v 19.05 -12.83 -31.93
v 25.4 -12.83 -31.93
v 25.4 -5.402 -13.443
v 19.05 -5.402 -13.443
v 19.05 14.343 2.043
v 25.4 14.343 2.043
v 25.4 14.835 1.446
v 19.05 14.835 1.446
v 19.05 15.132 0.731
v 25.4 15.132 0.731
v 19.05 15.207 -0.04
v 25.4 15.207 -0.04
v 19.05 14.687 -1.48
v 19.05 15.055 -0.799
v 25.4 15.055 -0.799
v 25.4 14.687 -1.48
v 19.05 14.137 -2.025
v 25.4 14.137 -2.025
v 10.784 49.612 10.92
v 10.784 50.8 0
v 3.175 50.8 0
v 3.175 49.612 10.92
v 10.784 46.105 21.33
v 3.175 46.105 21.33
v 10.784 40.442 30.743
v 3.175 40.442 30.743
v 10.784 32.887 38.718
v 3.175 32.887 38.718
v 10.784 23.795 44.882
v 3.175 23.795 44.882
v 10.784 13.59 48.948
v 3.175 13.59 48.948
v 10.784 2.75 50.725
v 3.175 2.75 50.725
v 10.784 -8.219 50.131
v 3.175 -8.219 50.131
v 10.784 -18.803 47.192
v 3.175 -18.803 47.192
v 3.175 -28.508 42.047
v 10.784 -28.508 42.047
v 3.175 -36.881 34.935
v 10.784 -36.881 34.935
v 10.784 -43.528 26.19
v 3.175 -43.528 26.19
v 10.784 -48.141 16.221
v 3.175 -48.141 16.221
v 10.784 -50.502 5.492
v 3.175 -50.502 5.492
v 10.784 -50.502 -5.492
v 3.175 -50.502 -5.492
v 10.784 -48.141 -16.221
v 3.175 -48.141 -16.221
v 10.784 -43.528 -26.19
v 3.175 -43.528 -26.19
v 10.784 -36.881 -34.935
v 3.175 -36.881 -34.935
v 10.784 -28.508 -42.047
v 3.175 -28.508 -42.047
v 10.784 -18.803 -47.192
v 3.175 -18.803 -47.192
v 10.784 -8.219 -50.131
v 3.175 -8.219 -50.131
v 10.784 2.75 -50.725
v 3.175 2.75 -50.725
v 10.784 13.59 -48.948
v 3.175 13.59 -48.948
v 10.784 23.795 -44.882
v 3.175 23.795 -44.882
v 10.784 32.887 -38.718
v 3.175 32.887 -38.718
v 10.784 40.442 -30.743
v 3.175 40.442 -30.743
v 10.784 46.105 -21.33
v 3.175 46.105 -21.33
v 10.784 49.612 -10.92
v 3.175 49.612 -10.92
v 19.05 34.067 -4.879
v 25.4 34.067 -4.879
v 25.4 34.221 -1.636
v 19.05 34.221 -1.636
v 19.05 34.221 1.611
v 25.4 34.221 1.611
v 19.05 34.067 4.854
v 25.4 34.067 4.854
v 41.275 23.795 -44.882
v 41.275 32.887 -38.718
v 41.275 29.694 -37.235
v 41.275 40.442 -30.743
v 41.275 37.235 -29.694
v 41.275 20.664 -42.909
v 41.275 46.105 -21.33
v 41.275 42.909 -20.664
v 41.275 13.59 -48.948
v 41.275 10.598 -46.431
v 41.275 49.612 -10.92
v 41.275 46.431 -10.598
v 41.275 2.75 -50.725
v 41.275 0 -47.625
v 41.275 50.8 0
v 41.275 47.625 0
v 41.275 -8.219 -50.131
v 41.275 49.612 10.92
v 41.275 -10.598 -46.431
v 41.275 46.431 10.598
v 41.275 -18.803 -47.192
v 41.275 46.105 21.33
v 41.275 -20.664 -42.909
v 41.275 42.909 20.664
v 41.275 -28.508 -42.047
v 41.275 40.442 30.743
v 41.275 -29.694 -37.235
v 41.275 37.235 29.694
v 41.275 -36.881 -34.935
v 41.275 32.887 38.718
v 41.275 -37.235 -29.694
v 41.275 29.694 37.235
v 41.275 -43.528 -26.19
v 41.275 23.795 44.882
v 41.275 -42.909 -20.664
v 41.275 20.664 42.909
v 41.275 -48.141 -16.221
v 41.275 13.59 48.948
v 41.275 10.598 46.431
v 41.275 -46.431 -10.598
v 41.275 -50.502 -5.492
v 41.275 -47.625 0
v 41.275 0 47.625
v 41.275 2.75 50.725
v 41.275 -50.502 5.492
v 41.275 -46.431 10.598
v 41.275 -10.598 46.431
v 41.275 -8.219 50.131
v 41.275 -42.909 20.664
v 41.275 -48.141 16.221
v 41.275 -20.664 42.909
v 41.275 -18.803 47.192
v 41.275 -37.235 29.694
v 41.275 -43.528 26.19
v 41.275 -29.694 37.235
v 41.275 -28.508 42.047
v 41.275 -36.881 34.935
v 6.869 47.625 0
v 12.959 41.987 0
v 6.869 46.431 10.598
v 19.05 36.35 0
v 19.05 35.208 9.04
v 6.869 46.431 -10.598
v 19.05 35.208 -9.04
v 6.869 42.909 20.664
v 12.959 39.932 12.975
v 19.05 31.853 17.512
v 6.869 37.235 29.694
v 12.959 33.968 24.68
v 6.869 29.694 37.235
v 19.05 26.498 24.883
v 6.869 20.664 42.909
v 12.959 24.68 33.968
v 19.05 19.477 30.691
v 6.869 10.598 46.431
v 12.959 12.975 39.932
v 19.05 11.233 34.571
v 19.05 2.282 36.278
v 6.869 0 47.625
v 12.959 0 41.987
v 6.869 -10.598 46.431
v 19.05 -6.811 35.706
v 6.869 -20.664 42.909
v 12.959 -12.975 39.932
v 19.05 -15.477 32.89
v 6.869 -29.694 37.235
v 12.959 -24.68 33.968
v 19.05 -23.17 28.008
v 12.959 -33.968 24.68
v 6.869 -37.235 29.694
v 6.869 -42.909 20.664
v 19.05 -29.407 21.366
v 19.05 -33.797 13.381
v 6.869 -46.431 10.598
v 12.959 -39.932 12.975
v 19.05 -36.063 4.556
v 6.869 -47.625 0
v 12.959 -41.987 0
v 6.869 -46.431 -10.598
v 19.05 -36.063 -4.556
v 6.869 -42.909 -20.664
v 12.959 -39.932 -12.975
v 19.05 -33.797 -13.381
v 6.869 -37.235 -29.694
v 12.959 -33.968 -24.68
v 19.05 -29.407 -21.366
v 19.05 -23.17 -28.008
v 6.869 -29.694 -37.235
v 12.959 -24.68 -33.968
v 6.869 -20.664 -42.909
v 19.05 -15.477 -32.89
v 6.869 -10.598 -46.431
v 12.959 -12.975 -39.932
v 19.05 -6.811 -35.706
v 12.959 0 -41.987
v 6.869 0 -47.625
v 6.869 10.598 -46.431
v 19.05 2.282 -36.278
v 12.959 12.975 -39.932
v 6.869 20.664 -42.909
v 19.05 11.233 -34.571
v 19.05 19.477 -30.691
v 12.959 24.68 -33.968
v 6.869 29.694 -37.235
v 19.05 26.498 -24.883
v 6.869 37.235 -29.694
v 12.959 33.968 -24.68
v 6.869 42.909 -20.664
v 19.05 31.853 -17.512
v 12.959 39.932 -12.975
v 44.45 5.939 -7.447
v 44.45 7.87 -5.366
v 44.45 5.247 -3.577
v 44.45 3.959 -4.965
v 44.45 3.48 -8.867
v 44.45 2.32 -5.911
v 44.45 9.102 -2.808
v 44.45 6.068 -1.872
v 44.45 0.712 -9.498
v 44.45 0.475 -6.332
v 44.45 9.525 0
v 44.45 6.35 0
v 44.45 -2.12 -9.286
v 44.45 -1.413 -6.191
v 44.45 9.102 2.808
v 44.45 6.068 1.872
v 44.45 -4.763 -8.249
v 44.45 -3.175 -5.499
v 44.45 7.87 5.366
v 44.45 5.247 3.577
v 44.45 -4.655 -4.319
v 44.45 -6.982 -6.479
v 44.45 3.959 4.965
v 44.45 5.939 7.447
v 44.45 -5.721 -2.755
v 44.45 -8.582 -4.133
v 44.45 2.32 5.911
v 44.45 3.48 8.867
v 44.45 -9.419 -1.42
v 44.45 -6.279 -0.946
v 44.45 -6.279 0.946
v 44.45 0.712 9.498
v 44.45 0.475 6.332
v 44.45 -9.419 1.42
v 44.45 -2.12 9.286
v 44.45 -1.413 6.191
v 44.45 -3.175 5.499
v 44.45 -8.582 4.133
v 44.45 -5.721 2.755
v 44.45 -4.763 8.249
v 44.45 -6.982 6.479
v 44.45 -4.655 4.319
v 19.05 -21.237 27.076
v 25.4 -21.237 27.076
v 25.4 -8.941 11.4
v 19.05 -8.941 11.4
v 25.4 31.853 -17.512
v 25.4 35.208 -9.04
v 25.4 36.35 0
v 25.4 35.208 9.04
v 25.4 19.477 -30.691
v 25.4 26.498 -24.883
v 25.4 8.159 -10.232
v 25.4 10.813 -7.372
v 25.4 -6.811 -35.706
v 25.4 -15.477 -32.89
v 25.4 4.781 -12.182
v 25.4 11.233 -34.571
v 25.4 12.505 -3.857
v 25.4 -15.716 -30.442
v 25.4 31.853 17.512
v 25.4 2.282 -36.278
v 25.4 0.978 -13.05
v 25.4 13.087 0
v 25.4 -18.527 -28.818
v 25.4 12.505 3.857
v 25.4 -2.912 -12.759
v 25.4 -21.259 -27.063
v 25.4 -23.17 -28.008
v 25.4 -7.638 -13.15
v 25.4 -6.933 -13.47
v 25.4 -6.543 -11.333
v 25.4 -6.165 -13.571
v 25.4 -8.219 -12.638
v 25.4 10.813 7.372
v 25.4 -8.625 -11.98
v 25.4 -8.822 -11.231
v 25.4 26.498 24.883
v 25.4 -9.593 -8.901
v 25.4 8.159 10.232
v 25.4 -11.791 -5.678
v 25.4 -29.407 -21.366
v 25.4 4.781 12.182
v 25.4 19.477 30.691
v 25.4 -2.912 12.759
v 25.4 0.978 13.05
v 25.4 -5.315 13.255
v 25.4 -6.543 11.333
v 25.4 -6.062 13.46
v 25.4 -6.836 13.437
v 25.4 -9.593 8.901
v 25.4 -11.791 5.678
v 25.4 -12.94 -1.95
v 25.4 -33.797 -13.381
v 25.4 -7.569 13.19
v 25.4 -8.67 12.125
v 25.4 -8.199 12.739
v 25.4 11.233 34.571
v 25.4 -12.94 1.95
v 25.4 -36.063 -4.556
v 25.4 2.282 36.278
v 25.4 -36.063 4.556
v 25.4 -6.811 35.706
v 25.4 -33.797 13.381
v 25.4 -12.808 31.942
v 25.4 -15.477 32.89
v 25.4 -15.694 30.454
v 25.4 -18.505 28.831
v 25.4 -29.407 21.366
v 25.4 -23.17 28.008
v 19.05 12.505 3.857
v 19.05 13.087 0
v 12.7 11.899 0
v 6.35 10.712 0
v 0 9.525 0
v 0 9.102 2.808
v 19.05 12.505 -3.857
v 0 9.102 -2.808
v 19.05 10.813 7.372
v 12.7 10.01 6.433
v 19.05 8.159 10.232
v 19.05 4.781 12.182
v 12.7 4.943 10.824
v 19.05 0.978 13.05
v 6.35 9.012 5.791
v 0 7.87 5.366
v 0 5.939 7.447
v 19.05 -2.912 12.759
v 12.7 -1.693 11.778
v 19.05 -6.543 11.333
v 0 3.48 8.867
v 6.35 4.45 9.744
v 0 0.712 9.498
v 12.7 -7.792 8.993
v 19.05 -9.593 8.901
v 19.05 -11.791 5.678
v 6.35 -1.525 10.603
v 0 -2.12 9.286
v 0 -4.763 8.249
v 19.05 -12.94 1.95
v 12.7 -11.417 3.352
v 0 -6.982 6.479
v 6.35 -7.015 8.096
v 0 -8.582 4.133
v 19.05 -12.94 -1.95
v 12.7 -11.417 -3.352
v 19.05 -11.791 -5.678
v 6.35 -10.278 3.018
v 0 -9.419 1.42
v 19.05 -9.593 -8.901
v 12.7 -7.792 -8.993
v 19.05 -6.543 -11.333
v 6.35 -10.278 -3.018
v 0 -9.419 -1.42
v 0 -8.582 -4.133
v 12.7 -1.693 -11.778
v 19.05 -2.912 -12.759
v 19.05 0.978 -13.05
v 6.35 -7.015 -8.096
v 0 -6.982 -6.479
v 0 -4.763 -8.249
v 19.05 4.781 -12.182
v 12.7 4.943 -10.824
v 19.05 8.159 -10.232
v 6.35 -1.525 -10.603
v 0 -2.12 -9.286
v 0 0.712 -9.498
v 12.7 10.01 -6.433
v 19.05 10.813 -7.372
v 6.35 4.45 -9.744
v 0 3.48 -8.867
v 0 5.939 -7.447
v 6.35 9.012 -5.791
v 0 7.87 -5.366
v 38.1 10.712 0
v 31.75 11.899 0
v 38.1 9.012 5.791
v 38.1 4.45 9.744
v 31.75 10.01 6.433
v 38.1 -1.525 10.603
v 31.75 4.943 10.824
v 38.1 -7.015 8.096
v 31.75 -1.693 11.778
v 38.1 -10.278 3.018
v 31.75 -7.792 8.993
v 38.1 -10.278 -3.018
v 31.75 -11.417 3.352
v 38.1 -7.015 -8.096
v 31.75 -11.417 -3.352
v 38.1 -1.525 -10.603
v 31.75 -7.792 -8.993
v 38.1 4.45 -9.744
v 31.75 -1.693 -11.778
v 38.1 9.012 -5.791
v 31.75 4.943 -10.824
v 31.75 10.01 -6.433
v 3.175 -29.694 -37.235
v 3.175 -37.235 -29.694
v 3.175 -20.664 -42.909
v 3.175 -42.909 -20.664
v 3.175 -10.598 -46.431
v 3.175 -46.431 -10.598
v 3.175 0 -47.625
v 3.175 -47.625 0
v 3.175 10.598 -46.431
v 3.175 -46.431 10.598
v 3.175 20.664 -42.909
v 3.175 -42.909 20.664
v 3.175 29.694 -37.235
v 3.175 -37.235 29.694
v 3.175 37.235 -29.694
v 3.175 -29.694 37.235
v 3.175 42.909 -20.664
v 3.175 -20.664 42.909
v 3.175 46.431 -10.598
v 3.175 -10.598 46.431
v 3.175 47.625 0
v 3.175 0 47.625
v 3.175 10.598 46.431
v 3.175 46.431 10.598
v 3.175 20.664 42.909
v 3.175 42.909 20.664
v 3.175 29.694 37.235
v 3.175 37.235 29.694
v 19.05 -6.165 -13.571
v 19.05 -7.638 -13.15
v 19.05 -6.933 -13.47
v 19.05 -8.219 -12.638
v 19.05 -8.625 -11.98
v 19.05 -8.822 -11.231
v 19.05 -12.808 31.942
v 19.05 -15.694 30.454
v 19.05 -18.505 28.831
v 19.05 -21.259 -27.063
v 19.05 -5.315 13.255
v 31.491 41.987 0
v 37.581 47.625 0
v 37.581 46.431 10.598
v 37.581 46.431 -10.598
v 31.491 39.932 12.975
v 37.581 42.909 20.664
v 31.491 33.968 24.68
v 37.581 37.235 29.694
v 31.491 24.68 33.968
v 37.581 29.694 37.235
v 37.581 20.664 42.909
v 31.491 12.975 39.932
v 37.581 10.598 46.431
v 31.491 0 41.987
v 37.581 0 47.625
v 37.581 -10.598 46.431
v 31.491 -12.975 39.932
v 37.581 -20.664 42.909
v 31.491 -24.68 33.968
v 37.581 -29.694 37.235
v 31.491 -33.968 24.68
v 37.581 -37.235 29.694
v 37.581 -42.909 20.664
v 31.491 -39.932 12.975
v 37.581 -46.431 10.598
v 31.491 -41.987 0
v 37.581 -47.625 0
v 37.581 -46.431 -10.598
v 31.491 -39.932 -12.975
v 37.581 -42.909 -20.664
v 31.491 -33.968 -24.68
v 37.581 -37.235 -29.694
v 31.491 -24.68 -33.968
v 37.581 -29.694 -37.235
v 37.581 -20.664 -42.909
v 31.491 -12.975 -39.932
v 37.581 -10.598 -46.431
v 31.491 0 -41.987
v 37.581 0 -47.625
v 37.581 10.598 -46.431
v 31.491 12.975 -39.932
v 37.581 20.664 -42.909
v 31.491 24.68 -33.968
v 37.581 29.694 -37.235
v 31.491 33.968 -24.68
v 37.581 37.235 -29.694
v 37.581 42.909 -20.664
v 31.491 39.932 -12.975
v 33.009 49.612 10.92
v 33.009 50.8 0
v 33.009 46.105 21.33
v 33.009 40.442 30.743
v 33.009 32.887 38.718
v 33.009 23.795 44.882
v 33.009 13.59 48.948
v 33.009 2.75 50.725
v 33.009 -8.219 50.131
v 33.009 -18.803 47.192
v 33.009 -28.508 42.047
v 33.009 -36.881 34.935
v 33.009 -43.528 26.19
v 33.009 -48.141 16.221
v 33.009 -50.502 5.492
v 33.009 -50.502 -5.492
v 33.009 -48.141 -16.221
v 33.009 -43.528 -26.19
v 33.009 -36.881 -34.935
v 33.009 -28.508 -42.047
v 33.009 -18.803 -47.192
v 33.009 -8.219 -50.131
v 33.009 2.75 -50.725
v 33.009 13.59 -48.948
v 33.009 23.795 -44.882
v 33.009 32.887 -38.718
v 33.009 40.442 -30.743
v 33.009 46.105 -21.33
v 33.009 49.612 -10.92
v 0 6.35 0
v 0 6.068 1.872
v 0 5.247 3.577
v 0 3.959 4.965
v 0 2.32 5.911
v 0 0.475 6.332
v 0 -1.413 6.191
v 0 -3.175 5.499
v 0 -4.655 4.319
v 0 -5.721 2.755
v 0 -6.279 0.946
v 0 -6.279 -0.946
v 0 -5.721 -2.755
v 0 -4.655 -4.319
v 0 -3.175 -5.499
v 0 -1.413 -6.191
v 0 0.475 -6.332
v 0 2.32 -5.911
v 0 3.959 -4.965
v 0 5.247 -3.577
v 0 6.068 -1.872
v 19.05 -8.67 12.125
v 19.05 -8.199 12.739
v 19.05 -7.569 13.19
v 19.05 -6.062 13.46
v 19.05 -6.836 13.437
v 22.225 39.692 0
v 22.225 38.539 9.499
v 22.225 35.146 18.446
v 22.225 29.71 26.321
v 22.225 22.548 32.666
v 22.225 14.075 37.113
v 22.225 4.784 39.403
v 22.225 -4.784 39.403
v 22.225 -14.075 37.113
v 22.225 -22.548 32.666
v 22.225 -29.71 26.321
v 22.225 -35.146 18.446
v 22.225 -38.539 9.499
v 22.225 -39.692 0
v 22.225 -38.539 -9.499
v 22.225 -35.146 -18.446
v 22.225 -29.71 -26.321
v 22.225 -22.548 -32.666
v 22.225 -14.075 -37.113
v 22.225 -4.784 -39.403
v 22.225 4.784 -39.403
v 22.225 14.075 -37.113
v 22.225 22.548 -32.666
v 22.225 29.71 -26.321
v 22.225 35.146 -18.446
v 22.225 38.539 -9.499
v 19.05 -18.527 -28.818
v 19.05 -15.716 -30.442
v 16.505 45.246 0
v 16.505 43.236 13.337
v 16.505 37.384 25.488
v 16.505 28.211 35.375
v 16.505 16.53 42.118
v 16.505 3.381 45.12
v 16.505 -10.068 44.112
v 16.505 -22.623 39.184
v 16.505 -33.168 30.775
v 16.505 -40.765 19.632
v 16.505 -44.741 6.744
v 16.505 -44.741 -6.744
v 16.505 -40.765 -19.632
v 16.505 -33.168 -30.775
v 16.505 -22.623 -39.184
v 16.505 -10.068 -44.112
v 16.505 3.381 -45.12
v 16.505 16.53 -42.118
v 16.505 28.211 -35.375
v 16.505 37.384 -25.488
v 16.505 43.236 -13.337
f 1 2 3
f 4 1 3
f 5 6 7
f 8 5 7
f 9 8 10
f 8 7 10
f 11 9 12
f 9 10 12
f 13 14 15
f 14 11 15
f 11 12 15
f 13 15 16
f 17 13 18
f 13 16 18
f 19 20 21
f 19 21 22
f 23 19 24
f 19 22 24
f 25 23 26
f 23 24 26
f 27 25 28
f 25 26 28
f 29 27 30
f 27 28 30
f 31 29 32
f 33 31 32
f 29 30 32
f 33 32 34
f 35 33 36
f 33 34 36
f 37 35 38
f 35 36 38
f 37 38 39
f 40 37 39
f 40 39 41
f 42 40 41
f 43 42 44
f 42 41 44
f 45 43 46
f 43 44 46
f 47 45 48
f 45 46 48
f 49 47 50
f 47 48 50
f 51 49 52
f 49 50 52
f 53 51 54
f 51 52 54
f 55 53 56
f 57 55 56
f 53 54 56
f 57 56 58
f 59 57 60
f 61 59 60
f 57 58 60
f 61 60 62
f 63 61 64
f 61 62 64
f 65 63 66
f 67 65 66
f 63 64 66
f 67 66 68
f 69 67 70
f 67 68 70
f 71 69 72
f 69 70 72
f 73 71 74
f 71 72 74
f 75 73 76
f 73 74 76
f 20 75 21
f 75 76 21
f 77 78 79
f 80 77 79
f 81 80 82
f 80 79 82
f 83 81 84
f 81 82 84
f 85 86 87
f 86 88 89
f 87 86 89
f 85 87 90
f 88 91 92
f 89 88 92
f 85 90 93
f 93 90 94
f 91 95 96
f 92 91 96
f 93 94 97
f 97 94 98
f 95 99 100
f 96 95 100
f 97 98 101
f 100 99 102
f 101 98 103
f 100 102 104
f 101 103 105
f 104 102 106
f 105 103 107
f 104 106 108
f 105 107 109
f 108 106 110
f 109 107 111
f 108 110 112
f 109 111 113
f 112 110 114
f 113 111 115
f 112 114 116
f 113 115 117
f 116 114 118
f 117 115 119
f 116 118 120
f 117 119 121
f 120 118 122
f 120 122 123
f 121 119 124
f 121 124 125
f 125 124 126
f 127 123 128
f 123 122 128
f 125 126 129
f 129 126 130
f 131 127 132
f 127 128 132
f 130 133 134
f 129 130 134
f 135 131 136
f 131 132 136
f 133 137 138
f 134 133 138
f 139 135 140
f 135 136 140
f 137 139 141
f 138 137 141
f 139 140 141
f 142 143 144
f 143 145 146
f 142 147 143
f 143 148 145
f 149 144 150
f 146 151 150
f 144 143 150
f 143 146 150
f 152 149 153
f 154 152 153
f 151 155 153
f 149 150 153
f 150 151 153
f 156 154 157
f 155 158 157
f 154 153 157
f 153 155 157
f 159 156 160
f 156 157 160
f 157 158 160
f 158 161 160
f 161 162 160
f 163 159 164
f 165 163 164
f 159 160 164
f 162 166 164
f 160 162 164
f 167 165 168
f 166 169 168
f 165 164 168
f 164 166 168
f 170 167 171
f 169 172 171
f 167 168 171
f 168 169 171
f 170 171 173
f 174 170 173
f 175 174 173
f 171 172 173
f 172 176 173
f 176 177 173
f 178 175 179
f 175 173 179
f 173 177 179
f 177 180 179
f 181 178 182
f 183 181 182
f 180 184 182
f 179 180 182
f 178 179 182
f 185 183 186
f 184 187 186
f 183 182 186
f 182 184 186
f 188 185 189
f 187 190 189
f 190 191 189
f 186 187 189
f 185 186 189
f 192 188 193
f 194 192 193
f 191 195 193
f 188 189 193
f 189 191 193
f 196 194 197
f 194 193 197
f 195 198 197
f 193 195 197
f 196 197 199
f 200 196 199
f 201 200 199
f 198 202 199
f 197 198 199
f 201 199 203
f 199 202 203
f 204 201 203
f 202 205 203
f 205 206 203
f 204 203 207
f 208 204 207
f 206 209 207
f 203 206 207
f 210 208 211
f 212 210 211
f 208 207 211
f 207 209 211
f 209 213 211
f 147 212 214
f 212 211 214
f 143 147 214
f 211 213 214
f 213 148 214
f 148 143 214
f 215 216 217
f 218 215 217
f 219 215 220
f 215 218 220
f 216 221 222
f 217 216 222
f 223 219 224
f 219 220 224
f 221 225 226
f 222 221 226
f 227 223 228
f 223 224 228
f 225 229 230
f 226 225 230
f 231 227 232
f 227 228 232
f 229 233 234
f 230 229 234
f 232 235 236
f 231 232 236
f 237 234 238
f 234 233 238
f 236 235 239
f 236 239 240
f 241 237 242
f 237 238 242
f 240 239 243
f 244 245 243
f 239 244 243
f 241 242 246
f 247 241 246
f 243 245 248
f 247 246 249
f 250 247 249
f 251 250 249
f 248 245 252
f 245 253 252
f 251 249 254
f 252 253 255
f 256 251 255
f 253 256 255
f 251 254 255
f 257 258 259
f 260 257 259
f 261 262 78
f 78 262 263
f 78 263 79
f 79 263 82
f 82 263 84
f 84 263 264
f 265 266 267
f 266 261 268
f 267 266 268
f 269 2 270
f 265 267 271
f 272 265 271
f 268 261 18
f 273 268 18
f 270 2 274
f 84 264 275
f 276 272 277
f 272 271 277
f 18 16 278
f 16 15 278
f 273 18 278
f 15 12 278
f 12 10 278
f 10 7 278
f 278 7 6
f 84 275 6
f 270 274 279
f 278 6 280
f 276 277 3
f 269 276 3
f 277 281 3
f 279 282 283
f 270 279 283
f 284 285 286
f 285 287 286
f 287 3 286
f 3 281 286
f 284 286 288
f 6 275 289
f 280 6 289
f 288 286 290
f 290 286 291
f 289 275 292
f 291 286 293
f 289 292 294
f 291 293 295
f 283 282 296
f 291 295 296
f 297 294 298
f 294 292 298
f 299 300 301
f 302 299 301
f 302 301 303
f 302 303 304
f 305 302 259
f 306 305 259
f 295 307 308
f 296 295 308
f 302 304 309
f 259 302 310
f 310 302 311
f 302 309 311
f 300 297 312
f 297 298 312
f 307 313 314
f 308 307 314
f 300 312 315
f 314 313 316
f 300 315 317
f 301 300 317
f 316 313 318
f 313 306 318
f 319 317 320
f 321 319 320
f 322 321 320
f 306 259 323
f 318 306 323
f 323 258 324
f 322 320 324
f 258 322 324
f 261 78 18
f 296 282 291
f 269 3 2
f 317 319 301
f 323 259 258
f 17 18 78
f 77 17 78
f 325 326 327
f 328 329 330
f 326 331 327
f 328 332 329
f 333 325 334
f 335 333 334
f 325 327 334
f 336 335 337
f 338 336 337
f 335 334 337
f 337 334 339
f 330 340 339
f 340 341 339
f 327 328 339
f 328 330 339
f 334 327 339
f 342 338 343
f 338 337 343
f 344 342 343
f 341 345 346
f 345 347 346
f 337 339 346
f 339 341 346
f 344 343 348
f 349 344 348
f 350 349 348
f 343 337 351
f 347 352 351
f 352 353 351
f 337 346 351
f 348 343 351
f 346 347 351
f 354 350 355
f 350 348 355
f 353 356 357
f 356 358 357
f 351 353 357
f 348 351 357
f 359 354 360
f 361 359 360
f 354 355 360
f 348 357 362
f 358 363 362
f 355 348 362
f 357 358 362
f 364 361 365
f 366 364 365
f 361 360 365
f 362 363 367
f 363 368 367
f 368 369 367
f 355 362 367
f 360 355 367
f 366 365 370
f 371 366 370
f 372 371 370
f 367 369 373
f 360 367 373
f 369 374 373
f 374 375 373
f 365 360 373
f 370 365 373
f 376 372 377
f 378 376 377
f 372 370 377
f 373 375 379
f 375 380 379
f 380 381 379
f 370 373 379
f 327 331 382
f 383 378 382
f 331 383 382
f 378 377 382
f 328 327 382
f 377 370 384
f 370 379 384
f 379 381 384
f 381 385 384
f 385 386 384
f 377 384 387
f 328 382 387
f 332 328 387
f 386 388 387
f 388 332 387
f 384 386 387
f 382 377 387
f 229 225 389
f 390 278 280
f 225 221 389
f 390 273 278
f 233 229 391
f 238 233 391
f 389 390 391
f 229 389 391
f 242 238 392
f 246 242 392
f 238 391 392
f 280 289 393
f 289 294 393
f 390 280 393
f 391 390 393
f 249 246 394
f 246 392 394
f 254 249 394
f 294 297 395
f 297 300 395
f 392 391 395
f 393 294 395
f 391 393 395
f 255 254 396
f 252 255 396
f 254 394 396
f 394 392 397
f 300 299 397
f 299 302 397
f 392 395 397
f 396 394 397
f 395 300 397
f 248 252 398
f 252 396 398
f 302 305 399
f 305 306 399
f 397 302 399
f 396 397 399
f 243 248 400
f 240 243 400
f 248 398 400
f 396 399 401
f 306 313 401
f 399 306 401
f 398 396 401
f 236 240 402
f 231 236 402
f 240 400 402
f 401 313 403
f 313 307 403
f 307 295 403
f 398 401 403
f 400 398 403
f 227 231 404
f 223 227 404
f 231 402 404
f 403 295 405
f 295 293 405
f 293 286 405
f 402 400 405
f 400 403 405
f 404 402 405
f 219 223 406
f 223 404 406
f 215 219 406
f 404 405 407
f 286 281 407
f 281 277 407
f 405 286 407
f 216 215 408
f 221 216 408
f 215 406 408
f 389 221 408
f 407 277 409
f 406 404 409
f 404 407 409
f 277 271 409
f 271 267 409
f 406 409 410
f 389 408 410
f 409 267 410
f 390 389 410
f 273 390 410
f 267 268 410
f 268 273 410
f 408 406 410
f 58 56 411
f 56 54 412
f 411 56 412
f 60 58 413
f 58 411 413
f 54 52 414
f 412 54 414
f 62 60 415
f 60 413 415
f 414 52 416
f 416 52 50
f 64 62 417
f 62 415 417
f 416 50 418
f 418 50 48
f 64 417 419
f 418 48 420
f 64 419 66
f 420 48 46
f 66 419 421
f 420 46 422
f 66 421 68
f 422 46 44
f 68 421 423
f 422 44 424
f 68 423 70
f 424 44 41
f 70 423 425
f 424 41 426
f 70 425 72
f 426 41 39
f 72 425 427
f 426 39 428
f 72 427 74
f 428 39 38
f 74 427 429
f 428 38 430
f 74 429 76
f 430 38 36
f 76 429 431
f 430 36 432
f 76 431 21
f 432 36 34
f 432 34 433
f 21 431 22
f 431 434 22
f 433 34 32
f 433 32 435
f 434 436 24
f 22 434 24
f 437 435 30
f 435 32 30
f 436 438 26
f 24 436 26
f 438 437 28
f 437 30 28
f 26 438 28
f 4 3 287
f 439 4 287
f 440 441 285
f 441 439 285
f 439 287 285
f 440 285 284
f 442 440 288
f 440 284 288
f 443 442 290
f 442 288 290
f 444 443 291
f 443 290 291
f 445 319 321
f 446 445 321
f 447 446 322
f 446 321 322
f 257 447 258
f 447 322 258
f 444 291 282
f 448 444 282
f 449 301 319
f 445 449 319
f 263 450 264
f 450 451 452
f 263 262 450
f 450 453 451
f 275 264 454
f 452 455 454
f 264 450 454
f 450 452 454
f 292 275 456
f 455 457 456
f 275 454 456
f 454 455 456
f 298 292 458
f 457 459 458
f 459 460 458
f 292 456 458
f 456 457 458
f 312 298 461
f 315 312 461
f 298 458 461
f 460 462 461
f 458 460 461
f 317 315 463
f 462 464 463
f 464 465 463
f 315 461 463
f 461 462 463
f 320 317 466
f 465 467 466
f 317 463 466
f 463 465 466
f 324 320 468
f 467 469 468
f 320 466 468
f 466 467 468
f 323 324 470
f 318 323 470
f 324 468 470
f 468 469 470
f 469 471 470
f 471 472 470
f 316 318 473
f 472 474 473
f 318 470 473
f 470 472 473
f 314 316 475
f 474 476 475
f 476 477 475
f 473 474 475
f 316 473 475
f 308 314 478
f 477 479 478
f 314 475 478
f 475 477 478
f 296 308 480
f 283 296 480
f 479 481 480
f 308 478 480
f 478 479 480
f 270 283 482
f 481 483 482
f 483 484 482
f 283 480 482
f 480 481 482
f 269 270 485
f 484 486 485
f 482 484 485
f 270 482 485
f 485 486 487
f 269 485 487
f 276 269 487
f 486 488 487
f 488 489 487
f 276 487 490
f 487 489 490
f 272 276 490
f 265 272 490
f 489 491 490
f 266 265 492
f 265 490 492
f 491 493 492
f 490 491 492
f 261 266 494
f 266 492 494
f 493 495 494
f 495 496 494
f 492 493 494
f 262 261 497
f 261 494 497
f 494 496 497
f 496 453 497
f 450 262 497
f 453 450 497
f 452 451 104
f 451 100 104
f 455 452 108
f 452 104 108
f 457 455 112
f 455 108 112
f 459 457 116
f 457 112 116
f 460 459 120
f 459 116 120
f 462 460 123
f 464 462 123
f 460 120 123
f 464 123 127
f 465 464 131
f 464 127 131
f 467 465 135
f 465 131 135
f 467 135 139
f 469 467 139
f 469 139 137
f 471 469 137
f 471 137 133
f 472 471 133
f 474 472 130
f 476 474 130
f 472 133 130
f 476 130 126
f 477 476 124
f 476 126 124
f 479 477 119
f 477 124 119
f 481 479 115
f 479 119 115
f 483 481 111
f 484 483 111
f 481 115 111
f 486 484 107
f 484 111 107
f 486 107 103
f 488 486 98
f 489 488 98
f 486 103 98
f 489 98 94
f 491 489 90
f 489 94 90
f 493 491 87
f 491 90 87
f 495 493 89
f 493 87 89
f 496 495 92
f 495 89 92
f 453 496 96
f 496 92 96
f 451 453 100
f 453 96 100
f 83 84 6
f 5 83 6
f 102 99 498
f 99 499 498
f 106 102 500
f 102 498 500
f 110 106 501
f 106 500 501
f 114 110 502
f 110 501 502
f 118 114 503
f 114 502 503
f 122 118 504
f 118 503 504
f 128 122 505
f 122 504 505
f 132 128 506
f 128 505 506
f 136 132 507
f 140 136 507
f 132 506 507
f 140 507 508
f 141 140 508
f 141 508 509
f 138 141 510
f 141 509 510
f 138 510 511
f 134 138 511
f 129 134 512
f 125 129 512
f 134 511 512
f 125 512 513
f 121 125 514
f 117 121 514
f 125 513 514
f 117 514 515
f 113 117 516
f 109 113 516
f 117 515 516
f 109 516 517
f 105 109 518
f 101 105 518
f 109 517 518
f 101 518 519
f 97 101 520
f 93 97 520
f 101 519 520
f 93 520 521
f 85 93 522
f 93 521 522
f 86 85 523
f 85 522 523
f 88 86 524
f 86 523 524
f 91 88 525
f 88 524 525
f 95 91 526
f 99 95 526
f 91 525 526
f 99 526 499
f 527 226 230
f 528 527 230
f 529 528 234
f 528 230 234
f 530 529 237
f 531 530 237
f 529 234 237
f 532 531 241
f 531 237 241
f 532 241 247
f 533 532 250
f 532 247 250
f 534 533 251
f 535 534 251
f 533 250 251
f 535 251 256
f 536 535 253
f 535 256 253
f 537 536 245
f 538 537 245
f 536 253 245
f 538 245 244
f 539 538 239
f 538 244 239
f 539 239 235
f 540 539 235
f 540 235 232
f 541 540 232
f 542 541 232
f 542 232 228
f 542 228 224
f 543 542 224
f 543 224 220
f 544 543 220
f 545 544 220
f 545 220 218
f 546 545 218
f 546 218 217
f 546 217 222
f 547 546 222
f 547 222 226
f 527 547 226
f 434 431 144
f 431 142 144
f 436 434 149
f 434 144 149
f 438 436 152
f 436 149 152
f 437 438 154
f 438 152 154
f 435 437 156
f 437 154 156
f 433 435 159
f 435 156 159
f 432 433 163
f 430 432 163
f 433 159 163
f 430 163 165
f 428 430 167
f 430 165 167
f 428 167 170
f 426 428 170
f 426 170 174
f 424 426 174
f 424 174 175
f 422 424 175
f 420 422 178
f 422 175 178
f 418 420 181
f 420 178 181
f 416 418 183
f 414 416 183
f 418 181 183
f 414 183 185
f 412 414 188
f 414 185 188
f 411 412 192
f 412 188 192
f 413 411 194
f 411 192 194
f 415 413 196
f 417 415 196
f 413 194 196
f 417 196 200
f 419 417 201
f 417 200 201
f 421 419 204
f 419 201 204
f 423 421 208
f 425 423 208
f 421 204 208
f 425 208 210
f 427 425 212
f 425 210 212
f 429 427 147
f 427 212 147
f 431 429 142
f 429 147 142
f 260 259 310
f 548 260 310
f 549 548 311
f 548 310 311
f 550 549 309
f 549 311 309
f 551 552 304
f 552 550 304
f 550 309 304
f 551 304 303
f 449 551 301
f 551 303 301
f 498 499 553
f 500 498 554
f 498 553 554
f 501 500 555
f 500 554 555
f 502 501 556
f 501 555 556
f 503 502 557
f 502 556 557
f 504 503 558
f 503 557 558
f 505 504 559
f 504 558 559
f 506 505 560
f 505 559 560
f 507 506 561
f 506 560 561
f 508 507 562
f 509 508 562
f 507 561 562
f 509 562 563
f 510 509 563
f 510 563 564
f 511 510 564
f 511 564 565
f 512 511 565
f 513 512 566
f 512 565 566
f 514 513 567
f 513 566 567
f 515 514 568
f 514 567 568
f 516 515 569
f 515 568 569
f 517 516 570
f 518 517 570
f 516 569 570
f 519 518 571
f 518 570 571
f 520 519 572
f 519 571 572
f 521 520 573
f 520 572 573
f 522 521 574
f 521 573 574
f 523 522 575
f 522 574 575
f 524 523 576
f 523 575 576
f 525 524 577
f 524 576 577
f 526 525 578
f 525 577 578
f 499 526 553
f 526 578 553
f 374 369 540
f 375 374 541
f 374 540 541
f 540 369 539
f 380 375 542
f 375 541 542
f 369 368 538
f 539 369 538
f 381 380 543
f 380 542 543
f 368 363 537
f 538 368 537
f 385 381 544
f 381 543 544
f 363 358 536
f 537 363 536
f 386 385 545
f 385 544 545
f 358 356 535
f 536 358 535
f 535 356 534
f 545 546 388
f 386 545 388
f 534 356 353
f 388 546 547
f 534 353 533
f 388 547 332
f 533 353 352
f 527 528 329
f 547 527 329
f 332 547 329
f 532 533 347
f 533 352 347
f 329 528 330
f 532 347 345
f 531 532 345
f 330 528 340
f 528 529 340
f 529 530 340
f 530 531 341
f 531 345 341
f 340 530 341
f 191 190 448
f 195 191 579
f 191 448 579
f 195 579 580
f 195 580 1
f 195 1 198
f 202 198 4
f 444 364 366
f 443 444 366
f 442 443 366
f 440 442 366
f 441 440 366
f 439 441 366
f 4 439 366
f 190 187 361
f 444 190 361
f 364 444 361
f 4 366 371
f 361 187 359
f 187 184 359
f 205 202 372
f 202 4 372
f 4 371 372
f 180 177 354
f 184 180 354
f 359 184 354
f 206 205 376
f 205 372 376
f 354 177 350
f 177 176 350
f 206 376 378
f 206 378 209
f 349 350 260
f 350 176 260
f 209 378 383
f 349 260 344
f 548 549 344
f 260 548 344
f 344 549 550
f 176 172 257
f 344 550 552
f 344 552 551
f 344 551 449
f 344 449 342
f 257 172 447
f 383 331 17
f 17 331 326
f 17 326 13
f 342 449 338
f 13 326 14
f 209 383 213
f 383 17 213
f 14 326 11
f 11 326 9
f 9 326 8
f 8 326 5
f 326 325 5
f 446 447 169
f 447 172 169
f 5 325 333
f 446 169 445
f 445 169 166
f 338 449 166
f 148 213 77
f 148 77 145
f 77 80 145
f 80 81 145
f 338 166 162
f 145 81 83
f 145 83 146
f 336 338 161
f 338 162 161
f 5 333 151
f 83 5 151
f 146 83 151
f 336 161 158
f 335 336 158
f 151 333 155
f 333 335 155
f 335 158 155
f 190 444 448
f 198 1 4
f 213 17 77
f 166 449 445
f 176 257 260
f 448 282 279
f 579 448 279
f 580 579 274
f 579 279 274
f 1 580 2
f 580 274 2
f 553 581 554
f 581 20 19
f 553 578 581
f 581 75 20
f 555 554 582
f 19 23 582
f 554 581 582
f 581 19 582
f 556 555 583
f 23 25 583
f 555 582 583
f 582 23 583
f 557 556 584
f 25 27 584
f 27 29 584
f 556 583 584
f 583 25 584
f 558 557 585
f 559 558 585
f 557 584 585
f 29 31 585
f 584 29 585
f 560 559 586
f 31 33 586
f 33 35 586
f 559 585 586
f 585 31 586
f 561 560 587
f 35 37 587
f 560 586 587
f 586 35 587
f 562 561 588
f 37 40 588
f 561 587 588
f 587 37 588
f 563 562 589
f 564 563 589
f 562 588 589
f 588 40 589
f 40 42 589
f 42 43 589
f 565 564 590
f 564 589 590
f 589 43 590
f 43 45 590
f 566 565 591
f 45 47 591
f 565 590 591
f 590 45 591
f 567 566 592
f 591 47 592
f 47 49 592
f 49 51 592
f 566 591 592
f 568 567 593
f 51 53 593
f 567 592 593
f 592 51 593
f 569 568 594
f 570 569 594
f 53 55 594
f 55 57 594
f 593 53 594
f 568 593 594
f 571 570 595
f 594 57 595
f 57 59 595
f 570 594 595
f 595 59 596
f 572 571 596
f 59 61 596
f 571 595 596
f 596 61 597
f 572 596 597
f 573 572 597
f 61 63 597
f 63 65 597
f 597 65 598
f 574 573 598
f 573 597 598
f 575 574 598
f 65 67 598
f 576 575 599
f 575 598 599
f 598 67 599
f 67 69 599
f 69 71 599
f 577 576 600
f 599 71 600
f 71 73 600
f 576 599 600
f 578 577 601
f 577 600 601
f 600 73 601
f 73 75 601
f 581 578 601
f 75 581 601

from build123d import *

# Parameters (mm, degrees)
F2_R     = 6.35
F3_DEPTH = 76.2
F5_DEPTH = 41.276


with BuildPart() as f1:
    # F0 (on Top) → F1 (revolve)
    with BuildSketch(Plane.XY):
        Polygon((0, 9.525), (0, 0), (22.225, 0), (44.45, 0), (44.45, 9.525), (25.4, 13.086654), (25.4, 36.349638), (37.581098, 47.625), (41.275, 47.625), (41.275, 50.8), (33.009252, 50.8), (22.225, 39.692349), (10.784252, 50.8), (3.175, 50.8), (3.175, 47.625), (6.868902, 47.625), (19.05, 36.349638), (19.05, 13.086654), align=None)
    revolve(axis=Axis((22.225, 0, 0), (1, 0, 0)))

    # F2 (on face) → F3 (cut)
    with BuildSketch(Plane.YZ.offset(44.45)):
        Circle(F2_R)
    extrude(amount=-F3_DEPTH, mode=Mode.SUBTRACT)

    # F4 (on face) → F5 (cut, through all)
    with BuildSketch(Plane.YZ.offset(41.275)):
        with BuildLine():
            ThreePointArc((-12.80801, 31.942442), (-17.109062, 29.659415), (-21.236747, 27.076108))
            Line((-21.236747, 27.076108), (-8.941196, 11.399711))
            ThreePointArc((-8.941196, 11.399711), (-7.569379, 13.189774), (-5.315075, 13.255492))
            Line((-5.315075, 13.255492), (-12.80801, 31.942442))
        make_face()
        with BuildLine():
            Line((34.066971, 4.853508), (14.343037, 2.043447))
            ThreePointArc((14.343037, 2.043447), (15.207368, -0.039612), (14.13713, -2.024756))
            Line((14.13713, -2.024756), (34.066971, -4.879159))
            ThreePointArc((34.066971, -4.879159), (34.240338, -0.012825), (34.066971, 4.853508))
        make_face()
        with BuildLine():
            ThreePointArc((-21.258962, -27.063283), (-17.131276, -29.646589), (-12.830224, -31.929617))
            Line((-12.830224, -31.929617), (-5.401842, -13.443158))
            ThreePointArc((-5.401842, -13.443158), (-7.63799, -13.150161), (-8.822055, -11.230736))
            Line((-8.822055, -11.230736), (-21.258962, -27.063283))
        make_face()
    extrude(amount=-F5_DEPTH, mode=Mode.SUBTRACT)


solid = f1.part
